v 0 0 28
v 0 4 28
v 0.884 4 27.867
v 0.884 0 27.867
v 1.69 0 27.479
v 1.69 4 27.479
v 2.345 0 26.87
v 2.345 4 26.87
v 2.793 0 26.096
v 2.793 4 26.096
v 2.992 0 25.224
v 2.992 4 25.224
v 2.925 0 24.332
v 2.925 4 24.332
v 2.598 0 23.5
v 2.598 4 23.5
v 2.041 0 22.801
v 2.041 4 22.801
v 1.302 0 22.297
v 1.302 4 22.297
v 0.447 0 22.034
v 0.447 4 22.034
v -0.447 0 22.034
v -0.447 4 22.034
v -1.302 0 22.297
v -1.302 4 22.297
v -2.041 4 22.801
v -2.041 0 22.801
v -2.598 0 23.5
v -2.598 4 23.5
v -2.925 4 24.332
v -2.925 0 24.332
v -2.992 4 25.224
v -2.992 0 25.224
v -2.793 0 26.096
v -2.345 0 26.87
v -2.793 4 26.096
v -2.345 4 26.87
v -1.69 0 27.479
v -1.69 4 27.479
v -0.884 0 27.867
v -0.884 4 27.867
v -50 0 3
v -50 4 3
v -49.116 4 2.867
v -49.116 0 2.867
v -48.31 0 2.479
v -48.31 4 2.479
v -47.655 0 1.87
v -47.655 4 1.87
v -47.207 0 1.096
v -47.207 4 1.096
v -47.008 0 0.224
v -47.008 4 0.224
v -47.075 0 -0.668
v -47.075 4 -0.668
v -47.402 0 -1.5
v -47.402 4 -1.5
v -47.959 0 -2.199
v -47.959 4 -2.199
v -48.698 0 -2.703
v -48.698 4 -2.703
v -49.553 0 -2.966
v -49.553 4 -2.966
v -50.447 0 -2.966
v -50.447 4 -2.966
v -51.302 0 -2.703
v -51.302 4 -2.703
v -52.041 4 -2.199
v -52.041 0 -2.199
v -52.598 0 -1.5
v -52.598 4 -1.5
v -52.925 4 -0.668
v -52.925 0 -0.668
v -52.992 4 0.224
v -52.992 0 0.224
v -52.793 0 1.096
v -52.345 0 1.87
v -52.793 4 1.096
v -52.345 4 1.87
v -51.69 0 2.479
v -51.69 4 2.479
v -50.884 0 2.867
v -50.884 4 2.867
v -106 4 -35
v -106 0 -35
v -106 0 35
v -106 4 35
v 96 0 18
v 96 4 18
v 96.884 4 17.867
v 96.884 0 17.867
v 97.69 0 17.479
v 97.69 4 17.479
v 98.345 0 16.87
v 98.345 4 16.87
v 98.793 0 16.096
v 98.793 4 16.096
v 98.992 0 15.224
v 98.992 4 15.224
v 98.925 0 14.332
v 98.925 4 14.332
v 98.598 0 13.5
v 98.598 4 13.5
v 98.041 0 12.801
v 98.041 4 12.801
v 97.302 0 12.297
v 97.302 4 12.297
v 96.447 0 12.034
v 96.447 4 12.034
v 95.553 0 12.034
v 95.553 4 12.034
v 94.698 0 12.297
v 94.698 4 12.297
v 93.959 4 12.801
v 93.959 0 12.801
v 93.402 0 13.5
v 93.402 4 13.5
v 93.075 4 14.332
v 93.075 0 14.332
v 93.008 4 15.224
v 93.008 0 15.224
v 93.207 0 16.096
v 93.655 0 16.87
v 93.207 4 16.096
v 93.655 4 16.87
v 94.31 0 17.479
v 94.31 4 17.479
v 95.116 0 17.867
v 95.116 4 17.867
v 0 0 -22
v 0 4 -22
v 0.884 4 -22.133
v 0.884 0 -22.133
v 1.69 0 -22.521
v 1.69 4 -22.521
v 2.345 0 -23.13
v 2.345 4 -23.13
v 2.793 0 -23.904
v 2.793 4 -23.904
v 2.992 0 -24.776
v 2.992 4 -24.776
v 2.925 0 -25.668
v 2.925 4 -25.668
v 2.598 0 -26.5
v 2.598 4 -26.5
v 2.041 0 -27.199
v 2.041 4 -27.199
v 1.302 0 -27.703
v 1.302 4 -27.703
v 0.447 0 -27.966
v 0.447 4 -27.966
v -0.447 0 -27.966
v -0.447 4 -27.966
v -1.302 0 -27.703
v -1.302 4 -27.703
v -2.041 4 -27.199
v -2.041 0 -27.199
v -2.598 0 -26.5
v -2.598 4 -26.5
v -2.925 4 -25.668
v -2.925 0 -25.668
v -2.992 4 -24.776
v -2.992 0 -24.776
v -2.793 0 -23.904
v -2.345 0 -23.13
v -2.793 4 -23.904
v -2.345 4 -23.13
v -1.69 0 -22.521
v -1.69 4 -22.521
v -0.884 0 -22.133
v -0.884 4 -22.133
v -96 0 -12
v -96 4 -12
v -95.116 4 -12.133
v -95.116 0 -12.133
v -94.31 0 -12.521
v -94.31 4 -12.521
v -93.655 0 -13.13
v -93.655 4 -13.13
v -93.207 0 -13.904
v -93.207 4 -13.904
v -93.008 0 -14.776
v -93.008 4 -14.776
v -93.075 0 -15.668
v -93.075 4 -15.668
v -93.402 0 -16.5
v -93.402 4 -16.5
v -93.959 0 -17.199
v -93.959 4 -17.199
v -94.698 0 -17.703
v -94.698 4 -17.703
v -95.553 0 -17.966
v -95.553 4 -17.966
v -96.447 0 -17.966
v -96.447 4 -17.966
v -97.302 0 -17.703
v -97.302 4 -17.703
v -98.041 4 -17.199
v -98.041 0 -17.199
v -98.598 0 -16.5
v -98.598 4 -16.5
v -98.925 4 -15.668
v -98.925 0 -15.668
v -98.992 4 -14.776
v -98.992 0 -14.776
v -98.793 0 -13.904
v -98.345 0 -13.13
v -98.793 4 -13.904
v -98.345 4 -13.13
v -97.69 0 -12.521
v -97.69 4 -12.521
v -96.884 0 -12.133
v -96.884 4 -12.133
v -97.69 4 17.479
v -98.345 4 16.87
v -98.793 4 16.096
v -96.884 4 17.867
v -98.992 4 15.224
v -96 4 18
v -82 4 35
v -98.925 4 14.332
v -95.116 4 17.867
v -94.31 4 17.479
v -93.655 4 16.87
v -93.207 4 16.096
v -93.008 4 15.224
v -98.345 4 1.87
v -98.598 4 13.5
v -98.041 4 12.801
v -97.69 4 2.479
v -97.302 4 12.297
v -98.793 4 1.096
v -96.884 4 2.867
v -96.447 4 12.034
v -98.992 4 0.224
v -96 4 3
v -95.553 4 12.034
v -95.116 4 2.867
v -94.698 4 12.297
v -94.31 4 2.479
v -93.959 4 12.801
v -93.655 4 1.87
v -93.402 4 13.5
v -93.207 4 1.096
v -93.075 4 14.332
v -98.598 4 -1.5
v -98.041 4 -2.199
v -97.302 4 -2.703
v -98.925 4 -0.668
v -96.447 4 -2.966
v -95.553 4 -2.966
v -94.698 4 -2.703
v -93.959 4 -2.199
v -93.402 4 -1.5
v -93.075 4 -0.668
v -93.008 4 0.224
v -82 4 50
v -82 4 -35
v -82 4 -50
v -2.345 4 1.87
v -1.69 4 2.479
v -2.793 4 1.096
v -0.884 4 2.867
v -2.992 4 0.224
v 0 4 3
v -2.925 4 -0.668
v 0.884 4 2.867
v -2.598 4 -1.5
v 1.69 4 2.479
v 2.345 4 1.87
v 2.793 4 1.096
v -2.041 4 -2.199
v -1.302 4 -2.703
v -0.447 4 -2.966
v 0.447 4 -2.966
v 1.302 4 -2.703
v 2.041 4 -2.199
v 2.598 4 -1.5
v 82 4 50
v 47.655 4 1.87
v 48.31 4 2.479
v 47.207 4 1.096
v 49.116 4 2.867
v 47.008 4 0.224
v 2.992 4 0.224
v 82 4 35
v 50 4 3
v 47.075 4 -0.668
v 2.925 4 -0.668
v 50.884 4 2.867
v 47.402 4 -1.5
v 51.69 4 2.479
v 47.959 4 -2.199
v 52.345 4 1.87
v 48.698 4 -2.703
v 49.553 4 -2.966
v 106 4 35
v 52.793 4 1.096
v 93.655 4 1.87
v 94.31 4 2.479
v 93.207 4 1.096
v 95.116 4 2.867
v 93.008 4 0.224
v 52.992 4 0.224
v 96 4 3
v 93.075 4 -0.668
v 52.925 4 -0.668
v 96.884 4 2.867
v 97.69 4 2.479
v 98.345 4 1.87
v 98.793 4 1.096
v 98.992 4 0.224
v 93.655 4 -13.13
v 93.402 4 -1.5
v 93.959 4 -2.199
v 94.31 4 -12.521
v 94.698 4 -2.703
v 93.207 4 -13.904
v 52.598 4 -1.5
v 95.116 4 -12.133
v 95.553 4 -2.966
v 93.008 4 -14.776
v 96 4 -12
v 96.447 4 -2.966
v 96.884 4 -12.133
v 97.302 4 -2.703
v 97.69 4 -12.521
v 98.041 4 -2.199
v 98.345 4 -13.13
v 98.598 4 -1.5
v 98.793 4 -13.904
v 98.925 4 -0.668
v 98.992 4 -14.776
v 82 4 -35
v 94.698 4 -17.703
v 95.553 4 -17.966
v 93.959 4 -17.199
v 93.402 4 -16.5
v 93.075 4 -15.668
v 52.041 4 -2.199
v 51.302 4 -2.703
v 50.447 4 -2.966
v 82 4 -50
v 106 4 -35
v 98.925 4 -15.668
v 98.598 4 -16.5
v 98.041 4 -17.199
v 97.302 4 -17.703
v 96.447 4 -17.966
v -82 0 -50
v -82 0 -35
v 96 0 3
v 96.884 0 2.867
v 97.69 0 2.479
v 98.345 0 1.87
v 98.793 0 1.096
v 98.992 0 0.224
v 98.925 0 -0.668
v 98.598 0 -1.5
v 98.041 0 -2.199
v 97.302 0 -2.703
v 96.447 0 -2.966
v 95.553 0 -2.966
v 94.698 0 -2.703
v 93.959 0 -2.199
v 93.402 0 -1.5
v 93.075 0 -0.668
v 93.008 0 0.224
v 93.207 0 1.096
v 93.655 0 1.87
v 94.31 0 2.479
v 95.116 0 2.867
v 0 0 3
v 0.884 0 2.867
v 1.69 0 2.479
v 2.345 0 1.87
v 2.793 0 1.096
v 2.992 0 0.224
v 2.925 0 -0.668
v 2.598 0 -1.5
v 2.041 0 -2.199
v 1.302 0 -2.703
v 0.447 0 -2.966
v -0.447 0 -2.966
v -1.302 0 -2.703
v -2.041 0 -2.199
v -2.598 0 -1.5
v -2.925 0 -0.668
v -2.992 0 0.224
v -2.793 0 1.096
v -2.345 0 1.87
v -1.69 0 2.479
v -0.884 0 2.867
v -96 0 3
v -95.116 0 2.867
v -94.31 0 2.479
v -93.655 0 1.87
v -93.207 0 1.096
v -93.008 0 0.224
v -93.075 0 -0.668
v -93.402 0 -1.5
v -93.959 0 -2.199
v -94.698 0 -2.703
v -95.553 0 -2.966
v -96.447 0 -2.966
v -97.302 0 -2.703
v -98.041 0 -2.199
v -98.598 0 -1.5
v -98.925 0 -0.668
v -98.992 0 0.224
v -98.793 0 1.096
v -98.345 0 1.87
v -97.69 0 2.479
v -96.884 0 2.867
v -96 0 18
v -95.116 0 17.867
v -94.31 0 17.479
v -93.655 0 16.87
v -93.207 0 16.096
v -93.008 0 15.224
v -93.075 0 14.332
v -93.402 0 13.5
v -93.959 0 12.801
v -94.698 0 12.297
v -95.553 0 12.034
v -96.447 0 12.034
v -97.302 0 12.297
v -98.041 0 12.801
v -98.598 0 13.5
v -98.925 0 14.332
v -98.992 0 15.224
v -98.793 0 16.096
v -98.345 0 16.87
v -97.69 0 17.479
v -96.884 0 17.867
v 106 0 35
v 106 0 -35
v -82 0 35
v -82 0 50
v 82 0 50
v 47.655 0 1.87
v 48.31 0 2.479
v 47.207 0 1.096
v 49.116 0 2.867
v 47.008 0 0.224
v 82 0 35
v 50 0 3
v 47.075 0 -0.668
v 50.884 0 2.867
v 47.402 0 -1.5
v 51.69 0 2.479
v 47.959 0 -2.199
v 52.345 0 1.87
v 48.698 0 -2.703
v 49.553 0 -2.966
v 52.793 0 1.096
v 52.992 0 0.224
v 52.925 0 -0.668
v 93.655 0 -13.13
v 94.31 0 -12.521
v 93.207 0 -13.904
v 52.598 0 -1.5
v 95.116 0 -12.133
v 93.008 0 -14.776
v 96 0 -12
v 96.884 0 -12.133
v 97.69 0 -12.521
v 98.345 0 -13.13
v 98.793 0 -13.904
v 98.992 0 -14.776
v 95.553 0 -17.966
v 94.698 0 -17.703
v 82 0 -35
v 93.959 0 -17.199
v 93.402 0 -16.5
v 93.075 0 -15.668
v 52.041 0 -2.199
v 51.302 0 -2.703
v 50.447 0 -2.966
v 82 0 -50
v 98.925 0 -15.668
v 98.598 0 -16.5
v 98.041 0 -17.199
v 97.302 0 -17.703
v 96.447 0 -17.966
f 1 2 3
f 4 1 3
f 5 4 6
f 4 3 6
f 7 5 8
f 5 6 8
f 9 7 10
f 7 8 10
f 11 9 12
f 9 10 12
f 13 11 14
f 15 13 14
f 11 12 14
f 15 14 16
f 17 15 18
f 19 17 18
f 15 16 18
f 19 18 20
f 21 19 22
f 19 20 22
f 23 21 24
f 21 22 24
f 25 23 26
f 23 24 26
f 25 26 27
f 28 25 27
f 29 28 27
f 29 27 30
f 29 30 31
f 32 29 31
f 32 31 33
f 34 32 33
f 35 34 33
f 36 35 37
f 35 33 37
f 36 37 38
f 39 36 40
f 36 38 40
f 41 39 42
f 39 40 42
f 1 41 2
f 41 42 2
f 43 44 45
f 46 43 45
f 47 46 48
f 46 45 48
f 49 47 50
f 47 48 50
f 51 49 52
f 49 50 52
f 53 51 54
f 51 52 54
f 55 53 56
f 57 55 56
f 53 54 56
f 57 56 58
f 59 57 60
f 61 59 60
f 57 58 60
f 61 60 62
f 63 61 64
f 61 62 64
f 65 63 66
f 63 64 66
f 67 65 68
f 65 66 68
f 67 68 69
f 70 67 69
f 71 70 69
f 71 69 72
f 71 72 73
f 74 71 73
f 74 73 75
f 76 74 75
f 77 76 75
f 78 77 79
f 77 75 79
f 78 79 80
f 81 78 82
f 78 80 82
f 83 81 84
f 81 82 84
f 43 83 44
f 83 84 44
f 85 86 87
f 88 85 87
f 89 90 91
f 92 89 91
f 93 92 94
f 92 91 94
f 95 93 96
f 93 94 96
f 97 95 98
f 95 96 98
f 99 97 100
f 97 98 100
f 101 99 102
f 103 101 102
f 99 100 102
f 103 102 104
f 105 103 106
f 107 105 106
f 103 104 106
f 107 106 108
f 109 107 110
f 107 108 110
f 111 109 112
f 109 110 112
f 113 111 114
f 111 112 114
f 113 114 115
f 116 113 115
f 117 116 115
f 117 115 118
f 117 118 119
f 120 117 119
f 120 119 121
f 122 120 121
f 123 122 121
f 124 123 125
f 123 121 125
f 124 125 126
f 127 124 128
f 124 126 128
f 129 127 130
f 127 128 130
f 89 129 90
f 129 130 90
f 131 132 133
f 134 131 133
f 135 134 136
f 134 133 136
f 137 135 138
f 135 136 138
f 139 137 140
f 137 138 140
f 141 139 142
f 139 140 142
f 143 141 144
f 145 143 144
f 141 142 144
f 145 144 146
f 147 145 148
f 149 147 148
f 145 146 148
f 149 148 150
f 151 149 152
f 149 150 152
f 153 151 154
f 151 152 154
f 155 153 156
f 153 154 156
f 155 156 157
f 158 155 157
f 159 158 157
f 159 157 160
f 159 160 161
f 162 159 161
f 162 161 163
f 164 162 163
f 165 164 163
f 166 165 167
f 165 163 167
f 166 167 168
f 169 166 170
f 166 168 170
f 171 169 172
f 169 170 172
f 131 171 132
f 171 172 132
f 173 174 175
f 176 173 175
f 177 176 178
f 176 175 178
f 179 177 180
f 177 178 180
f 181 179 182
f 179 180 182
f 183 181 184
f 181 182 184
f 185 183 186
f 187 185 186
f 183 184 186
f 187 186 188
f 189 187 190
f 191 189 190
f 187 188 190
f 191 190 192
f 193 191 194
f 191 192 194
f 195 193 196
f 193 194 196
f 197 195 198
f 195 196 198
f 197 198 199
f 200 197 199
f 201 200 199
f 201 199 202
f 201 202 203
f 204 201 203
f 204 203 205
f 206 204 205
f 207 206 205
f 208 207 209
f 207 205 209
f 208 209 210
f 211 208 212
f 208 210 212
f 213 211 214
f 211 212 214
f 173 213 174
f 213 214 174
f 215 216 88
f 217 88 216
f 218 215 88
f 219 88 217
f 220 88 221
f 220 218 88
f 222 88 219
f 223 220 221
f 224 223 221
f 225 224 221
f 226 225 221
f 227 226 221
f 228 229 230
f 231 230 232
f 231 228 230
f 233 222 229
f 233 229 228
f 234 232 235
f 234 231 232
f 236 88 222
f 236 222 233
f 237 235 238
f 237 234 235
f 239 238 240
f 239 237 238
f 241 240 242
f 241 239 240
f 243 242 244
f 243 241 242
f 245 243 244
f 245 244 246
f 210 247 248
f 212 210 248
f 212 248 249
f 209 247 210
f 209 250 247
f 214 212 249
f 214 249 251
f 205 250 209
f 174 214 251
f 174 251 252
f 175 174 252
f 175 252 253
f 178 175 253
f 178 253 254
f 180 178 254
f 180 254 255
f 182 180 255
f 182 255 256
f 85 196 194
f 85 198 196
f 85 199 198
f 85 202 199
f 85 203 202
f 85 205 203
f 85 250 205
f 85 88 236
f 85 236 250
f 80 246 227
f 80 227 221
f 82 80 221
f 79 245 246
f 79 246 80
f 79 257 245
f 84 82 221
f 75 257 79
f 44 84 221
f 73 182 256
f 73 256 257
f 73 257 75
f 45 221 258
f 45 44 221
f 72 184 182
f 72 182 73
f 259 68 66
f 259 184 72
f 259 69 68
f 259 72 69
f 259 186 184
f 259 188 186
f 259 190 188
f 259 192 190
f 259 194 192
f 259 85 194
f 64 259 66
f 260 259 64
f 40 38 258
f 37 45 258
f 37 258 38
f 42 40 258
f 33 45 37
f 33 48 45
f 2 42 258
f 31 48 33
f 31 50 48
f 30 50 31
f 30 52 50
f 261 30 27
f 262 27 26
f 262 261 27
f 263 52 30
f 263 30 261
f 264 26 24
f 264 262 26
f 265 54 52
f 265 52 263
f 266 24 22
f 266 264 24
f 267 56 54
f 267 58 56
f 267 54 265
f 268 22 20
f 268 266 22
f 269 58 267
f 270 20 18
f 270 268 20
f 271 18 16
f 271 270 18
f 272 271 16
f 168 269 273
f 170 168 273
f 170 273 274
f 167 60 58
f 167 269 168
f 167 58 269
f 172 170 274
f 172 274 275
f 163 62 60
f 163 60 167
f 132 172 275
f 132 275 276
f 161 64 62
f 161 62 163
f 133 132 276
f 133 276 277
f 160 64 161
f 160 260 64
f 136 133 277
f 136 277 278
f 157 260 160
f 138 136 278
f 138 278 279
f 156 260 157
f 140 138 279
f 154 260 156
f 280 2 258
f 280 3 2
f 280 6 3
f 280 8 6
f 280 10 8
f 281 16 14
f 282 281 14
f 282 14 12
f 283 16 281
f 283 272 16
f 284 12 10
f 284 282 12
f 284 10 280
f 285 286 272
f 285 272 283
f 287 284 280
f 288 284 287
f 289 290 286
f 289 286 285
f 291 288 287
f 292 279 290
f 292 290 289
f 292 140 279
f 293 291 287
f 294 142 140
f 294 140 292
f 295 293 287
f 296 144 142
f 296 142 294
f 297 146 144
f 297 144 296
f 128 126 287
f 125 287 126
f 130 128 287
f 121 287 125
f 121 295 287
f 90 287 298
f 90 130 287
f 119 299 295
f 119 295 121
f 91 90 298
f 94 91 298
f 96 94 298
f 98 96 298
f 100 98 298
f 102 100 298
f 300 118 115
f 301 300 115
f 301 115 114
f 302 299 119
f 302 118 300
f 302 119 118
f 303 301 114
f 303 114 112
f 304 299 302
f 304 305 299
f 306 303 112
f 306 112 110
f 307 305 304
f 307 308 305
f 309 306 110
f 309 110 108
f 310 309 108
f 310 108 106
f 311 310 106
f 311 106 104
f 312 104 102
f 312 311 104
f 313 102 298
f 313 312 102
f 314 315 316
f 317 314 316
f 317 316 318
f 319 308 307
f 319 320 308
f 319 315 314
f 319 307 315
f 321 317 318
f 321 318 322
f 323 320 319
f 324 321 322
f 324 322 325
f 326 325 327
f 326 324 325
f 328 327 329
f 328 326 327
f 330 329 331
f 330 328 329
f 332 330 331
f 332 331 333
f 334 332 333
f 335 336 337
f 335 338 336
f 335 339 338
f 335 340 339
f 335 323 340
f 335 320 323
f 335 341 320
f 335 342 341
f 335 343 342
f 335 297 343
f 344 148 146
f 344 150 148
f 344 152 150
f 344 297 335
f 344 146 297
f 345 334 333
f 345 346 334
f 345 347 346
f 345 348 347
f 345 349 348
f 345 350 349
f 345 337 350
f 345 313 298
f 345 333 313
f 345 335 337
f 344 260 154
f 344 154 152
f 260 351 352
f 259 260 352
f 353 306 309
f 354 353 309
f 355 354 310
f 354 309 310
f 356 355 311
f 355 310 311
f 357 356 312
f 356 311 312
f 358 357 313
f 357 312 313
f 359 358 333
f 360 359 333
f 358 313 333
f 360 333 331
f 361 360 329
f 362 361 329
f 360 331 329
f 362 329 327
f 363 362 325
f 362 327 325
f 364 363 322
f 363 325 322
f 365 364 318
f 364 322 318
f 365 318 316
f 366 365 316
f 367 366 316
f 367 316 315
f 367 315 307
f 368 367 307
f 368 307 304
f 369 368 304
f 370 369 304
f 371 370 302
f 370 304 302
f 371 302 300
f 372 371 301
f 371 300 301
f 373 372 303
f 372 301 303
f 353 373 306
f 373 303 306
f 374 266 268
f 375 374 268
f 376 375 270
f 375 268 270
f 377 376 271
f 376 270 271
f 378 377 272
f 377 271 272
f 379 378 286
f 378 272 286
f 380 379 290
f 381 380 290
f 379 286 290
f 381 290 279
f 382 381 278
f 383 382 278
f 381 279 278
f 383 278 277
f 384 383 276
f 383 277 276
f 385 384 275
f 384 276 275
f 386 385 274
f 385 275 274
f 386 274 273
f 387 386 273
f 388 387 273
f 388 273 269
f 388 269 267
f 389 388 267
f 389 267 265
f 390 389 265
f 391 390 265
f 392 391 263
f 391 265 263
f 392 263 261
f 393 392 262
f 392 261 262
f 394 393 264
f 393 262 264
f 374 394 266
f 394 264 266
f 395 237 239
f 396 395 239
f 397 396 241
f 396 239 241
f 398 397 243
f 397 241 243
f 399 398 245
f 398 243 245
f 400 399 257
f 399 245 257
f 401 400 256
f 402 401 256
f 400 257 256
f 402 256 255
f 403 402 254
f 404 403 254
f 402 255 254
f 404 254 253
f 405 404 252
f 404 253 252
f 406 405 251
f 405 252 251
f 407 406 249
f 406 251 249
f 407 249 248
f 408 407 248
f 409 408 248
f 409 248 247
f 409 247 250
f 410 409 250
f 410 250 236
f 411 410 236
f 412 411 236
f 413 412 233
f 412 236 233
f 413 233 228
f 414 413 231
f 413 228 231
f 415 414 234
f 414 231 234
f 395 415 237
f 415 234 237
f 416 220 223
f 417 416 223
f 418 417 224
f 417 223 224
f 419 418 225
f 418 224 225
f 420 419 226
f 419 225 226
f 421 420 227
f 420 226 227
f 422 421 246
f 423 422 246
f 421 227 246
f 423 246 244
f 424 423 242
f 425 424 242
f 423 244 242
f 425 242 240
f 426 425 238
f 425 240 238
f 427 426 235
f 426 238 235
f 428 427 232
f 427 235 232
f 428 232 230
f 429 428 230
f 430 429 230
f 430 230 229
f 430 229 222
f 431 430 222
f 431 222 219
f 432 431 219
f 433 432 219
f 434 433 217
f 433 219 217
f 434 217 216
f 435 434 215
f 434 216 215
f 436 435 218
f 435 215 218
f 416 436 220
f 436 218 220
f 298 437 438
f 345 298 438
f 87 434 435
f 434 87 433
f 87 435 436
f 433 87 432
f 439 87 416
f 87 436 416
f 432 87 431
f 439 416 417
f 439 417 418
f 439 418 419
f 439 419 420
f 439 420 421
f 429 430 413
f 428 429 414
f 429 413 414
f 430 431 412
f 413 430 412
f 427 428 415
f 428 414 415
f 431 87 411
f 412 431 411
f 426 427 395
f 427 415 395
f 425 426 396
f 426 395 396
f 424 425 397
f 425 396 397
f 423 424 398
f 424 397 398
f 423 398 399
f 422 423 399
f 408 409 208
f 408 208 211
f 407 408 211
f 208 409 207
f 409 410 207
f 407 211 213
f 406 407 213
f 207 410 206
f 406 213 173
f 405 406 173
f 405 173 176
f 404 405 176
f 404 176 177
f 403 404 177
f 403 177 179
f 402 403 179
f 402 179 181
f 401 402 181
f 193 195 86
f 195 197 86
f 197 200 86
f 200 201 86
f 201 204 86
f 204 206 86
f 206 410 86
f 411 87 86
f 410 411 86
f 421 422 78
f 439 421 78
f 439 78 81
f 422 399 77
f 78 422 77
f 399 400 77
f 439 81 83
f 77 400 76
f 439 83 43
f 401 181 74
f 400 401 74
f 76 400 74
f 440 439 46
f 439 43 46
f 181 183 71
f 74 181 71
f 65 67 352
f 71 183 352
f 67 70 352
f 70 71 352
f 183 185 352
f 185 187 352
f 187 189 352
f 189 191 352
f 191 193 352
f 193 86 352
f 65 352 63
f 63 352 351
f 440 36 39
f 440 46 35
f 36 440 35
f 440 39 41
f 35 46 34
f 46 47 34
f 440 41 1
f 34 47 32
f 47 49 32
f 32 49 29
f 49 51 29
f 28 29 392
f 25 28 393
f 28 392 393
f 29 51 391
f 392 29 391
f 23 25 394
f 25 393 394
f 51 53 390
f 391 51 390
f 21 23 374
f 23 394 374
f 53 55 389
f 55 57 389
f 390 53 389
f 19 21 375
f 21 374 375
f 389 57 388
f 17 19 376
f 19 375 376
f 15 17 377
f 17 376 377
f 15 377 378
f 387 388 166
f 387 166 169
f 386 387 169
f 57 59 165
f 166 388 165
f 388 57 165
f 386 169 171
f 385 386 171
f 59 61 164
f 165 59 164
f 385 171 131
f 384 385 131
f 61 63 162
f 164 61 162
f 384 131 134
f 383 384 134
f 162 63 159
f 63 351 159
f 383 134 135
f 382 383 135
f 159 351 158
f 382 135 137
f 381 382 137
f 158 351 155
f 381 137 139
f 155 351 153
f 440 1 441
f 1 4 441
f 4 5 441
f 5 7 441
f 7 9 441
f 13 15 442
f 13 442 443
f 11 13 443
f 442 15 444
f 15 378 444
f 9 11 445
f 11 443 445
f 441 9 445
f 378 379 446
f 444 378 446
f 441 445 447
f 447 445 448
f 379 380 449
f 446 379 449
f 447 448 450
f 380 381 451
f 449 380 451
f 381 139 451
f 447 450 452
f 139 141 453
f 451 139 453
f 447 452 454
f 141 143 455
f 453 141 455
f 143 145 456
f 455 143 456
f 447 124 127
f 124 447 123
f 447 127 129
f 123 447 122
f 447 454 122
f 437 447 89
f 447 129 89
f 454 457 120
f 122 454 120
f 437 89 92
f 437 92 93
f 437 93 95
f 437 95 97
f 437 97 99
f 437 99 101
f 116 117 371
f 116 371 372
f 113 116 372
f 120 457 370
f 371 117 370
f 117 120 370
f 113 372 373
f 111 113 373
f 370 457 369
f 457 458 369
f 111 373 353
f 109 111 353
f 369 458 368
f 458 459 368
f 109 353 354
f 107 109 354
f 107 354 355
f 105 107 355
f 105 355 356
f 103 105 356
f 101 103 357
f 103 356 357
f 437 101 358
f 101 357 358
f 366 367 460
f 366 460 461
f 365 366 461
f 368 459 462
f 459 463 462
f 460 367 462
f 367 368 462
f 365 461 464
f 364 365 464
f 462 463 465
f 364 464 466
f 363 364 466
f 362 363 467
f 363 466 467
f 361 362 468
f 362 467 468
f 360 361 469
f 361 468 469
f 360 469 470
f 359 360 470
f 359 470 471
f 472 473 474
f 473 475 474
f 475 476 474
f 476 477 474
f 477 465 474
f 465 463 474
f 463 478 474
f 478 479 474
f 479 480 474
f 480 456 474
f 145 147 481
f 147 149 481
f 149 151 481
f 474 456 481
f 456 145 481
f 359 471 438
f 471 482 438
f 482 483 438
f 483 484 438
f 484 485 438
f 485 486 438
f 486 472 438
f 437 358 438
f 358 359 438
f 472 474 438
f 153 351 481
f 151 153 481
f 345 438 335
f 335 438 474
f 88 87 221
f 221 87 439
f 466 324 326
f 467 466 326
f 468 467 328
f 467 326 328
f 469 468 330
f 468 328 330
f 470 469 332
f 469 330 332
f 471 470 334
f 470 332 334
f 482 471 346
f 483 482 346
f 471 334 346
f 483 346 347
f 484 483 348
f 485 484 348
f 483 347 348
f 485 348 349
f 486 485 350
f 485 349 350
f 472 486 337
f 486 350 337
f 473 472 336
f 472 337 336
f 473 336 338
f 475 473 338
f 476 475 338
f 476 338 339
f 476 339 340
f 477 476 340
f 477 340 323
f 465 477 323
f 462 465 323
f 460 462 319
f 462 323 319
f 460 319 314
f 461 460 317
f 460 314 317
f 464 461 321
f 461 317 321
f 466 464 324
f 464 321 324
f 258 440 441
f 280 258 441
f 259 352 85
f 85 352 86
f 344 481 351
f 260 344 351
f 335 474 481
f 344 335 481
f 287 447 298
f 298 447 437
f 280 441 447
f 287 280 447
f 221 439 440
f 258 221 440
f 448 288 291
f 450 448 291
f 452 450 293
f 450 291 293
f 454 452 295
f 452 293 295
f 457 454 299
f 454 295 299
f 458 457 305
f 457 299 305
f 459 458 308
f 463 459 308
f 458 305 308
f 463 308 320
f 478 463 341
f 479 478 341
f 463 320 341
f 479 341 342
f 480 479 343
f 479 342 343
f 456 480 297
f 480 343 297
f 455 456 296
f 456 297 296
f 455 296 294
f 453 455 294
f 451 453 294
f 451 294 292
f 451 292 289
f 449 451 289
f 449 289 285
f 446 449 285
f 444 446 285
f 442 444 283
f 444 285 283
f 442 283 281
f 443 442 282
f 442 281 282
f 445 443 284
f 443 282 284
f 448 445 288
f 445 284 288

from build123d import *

# Parameters (mm, degrees)
SALIENTE_EXTRUIR1_DEPTH = 4
CROQUIS2_R              = 3
CORTAR_EXTRUIR1_DEPTH   = 4
CROQUIS3_R              = 3
CORTAR_EXTRUIR2_DEPTH   = 4
CROQUIS4_R              = 3
CORTAR_EXTRUIR3_DEPTH   = 4


with BuildPart() as part:
    # Croquis1 → Saliente-Extruir1 (new body)
    with BuildSketch(Plane(origin=(0, 0, 0), x_dir=(1, 0, 0), z_dir=(0, 1, 0))):
        Polygon((-82, -35), (-82, -50), (82, -50), (82, -35), (106, -35), (106, 35), (82, 35), (82, 50), (-82, 50), (-82, 35), (-106, 35), (-106, -35), align=None)
    extrude(amount=SALIENTE_EXTRUIR1_DEPTH)

    # Croquis2 → Cortar-Extruir1 (cut)
    with BuildSketch(Plane(origin=(0, 4, 0), x_dir=(1, 0, 0), z_dir=(0, 1, 0))):
        with Locations(Location((-96, 0, 0), (0, 0, 270))):
            Circle(CROQUIS2_R)
        with Locations(Location((-96, 15, 0), (0, 0, 270))):
            Circle(CROQUIS2_R)
        with Locations(Location((-96, -15, 0), (0, 0, 270))):
            Circle(CROQUIS2_R)
    extrude(amount=-CORTAR_EXTRUIR1_DEPTH, mode=Mode.SUBTRACT)

    # Croquis3 → Cortar-Extruir2 (cut)
    with BuildSketch(Plane(origin=(0, 4, 0), x_dir=(1, 0, 0), z_dir=(0, 1, 0))):
        with Locations(Location((96, 15, 0), (0, 0, 270))):
            Circle(CROQUIS3_R)
        with Locations(Location((96, -15, 0), (0, 0, 270))):
            Circle(CROQUIS3_R)
        with Locations(Location((96, 0, 0), (0, 0, 270))):
            Circle(CROQUIS3_R)
    extrude(amount=-CORTAR_EXTRUIR2_DEPTH, mode=Mode.SUBTRACT)

    # Croquis4 → Cortar-Extruir3 (cut)
    with BuildSketch(Plane(origin=(0, 4, 0), x_dir=(1, 0, 0), z_dir=(0, 1, 0))):
        with Locations(Location((0, 25, 0), (0, 0, 270))):
            Circle(CROQUIS4_R)
        with Locations(Location((50, 0, 0), (0, 0, 270))):
            Circle(CROQUIS4_R)
        with Locations(Location((0, -25, 0), (0, 0, 270))):
            Circle(CROQUIS4_R)
        with Locations(Location((-50, 0, 0), (0, 0, 270))):
            Circle(CROQUIS4_R)
        with Locations(Location((0, 0, 0), (0, 0, 270))):
            Circle(CROQUIS4_R)
    extrude(amount=-CORTAR_EXTRUIR3_DEPTH, mode=Mode.SUBTRACT)


solid = part.part
